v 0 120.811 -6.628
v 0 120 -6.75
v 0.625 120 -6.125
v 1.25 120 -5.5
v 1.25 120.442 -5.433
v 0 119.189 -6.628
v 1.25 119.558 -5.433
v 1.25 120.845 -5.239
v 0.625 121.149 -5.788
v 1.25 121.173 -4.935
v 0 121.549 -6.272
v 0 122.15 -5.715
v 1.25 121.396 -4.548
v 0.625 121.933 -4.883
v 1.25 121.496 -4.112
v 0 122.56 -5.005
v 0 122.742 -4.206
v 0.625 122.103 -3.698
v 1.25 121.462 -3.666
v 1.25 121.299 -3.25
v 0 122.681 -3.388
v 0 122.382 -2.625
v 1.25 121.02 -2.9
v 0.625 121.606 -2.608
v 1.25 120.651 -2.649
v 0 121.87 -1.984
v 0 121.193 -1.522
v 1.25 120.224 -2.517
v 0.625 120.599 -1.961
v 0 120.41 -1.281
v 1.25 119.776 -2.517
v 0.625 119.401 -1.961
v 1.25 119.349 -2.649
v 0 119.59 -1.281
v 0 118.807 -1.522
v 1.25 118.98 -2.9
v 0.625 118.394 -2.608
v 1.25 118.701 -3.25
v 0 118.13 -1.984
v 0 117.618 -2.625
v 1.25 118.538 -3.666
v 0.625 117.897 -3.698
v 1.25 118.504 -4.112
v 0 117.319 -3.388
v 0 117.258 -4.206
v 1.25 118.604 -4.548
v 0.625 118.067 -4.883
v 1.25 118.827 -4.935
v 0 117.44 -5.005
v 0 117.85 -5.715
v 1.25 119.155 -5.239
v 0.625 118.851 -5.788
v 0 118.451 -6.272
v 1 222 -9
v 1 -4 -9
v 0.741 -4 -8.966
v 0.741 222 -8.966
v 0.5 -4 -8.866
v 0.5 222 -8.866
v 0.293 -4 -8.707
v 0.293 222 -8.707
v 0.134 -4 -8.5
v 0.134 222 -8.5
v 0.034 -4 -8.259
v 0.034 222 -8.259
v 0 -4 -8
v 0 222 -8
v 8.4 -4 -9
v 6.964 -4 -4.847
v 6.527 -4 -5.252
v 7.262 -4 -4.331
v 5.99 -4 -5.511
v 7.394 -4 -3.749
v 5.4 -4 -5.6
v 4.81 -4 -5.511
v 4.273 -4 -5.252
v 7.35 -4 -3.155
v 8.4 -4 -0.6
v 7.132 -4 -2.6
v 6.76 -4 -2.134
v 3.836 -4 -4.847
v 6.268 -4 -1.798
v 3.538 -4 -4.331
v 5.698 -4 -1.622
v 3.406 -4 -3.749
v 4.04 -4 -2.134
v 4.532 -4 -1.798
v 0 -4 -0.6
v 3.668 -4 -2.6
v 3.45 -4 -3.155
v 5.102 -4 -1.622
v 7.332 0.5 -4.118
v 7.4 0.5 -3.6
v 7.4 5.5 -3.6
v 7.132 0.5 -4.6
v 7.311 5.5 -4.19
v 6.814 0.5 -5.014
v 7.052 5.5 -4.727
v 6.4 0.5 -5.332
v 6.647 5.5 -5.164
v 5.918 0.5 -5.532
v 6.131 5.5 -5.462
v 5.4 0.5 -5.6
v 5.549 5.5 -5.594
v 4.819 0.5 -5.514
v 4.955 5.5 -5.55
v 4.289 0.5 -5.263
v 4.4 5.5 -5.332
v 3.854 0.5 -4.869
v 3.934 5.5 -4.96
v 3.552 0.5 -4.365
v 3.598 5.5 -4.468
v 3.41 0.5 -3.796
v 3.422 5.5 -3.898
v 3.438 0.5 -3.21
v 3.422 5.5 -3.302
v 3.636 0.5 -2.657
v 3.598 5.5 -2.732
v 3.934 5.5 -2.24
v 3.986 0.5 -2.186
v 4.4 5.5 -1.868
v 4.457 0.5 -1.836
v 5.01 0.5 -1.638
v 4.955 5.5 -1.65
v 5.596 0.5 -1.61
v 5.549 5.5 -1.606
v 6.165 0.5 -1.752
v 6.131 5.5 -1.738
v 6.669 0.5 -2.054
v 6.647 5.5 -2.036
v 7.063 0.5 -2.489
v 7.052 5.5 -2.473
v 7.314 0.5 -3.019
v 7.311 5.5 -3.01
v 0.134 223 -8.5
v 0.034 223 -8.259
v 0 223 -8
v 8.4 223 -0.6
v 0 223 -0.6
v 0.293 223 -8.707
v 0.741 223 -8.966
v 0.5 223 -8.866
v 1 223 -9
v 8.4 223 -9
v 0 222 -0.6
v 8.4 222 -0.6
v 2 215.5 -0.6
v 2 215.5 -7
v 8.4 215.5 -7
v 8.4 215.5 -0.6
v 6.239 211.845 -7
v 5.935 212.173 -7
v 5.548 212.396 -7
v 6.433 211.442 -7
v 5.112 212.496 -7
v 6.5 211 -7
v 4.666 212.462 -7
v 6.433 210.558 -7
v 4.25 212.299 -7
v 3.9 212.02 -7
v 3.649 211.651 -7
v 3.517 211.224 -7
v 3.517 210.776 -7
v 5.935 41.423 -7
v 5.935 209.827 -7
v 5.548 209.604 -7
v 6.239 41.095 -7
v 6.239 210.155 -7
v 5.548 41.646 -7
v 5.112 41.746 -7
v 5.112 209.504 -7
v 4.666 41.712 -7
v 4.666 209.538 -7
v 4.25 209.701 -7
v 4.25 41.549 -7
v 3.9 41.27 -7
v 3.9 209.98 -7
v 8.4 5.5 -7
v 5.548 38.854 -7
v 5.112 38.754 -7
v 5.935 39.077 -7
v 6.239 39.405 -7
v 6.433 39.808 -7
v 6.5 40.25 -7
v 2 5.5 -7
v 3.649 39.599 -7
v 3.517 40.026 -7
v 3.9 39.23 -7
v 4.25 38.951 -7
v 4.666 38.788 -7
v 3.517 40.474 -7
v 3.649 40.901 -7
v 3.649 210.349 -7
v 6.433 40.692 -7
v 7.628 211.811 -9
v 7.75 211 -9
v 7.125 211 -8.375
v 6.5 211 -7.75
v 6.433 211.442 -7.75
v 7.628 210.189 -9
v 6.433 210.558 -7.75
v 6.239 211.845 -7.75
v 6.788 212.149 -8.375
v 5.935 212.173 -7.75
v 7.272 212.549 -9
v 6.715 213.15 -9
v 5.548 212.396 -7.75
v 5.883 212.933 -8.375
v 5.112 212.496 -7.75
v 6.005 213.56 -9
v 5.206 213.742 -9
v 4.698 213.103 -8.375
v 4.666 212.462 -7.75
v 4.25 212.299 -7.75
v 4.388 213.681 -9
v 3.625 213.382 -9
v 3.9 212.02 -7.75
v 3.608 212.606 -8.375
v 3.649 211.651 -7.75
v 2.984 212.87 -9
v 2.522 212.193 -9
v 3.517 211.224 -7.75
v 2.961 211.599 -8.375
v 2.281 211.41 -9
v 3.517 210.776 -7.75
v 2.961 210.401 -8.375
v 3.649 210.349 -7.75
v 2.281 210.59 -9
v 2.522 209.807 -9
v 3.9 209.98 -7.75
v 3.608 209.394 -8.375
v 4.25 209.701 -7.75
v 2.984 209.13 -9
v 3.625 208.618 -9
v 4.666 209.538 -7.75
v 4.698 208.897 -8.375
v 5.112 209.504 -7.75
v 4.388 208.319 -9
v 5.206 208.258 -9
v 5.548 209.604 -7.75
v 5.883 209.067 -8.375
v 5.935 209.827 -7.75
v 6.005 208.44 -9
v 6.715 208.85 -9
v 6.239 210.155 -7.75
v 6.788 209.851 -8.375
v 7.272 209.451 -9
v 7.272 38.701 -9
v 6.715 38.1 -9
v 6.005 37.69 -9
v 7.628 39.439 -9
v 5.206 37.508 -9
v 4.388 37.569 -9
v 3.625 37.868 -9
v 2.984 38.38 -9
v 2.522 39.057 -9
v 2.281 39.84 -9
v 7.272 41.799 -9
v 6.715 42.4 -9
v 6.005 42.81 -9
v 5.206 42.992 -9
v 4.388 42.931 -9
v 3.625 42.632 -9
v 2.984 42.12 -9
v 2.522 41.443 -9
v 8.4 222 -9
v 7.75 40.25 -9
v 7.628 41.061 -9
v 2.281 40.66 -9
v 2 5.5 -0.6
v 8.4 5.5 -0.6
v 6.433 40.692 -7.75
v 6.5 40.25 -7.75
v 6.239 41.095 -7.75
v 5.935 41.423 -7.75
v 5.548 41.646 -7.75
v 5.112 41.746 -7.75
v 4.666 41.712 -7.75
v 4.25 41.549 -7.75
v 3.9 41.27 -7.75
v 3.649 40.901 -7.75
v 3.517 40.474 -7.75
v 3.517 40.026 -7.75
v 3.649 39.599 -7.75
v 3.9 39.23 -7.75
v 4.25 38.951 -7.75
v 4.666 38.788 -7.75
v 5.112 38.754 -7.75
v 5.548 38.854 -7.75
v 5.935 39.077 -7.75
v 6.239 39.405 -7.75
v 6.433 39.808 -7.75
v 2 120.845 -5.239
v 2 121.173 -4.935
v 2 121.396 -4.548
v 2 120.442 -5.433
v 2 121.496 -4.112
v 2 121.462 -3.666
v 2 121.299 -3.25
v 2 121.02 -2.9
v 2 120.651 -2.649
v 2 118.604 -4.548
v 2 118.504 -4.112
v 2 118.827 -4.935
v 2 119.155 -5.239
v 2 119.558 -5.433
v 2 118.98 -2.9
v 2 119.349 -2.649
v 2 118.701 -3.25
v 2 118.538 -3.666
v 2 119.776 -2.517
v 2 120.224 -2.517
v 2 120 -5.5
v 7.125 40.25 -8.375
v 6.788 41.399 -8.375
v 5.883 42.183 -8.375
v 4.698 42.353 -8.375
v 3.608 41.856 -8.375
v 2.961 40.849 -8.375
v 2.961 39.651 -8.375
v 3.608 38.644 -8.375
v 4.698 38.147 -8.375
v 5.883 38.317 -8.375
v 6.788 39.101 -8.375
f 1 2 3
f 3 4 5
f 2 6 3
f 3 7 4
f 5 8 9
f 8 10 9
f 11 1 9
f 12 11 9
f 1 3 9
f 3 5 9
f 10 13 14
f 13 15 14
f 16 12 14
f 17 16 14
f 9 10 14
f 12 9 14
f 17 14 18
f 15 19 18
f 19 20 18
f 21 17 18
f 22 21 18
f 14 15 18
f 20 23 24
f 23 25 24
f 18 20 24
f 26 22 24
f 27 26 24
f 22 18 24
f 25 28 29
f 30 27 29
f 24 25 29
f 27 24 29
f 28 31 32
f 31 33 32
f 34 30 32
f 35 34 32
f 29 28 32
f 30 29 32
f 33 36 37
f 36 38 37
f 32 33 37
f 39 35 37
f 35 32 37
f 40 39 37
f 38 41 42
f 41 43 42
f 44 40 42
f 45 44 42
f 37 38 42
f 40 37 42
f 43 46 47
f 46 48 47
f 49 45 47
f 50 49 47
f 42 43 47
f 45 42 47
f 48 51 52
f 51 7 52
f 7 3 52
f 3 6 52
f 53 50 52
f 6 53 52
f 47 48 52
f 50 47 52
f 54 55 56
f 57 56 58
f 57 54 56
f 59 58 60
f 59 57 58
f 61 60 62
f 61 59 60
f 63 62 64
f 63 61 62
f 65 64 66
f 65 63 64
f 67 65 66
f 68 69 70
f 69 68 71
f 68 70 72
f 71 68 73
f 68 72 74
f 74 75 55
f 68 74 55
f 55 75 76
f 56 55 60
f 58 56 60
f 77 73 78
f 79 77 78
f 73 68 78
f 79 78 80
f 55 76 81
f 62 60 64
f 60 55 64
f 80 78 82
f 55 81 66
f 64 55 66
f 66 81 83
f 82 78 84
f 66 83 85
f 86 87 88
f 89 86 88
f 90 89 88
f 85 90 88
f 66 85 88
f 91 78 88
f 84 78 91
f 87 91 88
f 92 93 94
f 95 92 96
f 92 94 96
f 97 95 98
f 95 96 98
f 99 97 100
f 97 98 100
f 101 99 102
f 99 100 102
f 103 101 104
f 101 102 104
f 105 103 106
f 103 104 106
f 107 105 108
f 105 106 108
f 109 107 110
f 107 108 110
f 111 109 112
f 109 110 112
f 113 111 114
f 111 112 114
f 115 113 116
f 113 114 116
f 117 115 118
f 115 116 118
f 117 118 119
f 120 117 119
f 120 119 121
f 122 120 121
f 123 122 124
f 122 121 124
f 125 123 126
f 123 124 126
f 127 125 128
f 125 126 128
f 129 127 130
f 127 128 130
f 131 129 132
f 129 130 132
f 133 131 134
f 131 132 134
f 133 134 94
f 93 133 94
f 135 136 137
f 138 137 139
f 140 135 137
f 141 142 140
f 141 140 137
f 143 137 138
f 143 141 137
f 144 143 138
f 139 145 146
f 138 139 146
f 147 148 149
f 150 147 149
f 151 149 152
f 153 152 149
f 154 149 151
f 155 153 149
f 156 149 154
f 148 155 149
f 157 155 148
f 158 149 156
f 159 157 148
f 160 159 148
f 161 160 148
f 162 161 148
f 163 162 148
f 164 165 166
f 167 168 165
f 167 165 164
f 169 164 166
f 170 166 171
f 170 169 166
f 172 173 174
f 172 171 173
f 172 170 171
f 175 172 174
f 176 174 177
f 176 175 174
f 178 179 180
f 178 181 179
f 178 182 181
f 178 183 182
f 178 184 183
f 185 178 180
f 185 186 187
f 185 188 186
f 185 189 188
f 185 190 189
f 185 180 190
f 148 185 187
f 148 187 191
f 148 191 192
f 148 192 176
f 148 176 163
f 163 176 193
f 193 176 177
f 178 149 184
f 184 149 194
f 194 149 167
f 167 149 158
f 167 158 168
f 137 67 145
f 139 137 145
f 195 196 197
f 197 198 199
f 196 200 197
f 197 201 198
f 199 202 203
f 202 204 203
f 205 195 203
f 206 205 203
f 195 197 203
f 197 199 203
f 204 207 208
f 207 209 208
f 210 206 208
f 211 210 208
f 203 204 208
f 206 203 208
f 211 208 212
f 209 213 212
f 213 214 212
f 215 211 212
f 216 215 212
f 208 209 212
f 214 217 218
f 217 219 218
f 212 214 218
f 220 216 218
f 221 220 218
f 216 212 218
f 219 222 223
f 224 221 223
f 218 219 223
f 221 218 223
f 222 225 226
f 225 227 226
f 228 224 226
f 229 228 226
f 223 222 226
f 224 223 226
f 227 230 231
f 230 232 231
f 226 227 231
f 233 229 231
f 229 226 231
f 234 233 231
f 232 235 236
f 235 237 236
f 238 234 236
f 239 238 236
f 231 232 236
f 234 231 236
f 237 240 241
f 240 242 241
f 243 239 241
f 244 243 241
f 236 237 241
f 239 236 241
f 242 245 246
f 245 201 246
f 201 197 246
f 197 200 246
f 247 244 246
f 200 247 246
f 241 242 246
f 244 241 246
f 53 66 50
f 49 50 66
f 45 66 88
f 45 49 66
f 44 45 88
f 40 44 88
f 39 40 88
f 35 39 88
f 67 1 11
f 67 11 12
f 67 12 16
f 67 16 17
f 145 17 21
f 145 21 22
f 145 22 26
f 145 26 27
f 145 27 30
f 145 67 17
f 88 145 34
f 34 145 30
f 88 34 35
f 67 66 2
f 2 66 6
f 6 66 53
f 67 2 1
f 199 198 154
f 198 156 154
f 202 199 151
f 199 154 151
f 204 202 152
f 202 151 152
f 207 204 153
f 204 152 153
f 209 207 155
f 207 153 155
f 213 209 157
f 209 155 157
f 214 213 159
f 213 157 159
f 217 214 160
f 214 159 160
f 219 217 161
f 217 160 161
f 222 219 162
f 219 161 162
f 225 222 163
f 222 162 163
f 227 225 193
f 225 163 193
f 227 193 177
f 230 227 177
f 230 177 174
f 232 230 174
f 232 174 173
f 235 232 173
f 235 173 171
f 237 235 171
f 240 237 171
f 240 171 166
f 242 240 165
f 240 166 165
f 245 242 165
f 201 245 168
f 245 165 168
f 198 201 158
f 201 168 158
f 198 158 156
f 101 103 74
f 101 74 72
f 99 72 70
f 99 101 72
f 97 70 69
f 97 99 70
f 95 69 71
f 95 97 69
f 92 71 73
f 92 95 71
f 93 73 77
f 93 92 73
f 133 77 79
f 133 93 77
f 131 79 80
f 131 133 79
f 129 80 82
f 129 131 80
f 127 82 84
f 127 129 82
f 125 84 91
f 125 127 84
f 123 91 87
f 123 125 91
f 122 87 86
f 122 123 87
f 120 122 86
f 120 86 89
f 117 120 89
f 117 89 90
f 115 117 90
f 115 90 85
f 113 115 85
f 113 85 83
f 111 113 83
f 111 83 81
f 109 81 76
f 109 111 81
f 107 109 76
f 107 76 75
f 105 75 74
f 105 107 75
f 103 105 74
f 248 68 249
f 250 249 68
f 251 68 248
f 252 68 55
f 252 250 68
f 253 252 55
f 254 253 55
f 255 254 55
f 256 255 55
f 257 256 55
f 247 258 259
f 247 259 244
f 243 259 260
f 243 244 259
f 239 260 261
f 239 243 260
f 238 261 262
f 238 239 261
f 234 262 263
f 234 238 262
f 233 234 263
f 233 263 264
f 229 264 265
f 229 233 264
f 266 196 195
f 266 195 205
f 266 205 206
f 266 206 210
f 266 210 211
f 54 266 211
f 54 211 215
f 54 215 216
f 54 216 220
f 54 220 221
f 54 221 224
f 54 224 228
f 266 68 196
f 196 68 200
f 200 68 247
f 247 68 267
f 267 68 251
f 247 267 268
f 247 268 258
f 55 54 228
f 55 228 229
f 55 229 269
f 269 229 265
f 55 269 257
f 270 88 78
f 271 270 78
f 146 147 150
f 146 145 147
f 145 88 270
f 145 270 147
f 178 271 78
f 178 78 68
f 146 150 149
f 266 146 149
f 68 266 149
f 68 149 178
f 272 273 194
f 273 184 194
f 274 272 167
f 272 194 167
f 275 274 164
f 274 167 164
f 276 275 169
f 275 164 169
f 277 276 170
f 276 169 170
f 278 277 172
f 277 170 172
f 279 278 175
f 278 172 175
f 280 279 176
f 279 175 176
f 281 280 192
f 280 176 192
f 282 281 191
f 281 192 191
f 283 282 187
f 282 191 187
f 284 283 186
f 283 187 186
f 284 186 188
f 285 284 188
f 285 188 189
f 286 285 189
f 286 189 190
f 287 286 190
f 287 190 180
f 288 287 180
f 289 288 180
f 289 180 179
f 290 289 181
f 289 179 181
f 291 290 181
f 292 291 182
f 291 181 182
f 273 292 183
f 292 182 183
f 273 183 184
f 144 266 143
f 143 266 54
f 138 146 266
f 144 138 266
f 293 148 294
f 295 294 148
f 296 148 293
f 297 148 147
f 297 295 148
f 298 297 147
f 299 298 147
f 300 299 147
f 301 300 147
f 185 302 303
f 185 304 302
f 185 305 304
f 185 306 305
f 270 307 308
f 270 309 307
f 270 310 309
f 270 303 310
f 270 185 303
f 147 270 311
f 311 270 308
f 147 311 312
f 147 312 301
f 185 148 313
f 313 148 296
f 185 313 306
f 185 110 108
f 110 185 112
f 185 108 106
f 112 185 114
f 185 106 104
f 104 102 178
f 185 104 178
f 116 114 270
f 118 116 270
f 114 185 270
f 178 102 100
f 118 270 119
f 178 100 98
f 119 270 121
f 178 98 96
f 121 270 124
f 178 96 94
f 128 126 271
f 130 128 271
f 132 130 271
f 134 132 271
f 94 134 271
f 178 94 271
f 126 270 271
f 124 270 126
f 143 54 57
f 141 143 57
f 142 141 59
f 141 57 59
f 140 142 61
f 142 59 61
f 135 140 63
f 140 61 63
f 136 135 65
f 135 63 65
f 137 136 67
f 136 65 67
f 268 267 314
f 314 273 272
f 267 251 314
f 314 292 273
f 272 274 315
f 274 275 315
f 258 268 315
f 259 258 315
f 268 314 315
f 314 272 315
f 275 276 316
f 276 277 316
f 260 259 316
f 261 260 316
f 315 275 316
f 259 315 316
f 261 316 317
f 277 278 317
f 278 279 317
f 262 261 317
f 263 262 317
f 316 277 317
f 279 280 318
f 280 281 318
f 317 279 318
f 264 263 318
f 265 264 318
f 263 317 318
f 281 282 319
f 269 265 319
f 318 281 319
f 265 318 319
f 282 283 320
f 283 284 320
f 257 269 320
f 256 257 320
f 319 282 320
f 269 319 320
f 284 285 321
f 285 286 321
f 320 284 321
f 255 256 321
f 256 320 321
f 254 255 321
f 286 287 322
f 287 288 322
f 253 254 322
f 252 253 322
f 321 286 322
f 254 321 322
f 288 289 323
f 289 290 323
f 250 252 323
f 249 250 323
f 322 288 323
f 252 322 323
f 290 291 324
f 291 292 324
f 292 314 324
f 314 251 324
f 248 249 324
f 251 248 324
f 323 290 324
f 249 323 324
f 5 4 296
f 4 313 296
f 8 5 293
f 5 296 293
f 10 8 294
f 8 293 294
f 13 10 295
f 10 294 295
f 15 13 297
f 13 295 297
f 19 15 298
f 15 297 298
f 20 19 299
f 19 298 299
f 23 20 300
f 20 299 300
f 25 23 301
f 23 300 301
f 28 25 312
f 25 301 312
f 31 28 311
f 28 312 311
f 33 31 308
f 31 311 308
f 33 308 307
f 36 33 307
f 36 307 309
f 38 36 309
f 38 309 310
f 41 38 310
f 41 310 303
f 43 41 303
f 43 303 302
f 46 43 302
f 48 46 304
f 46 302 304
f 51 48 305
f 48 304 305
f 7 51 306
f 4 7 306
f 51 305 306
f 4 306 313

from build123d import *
from build123d.topology import SkipClean

# Parameters (mm, degrees)
BOSS_EXTRUDE1_DEPTH                                 = 221.5
CSK_FOR_M3_COUNTERSUNK_FLAT_HEAD_SCREW1_D           = 3
CSK_FOR_M3_COUNTERSUNK_FLAT_HEAD_SCREW1_CSINK_D     = 5.5
CSK_FOR_M3_COUNTERSUNK_FLAT_HEAD_SCREW1_CSINK_ANGLE = 90
CSK_FOR_M3_COUNTERSUNK_FLAT_HEAD_SCREW4_D           = 3
CSK_FOR_M3_COUNTERSUNK_FLAT_HEAD_SCREW4_CSINK_D     = 5.5
CSK_FOR_M3_COUNTERSUNK_FLAT_HEAD_SCREW4_CSINK_ANGLE = 90
SKETCH12_W                                          = 8
SKETCH12_H                                          = 7
BOSS_EXTRUDE2_DEPTH                                 = 5.5
CUT_EXTRUDE1_DEPTH                                  = 359
BOSS_EXTRUDE3_DEPTH                                 = 3
BOSS_EXTRUDE4_DEPTH                                 = 2.5
BOSS_EXTRUDE4_DEPTH_BACK                            = 6
SKETCH19_W                                          = 0.6
SKETCH19_H                                          = 227
CUT_EXTRUDE2_DEPTH                                  = 10
SKETCH20_W                                          = 15.604741464
SKETCH20_H                                          = 2
CUT_EXTRUDE3_DEPTH                                  = 10
SKETCH21_W                                          = 0.6
SKETCH21_H                                          = 225
CUT_EXTRUDE4_DEPTH                                  = 10
SKETCH22_W                                          = 8.4
SKETCH22_H                                          = 5.5
CUT_EXTRUDE5_DEPTH                                  = 10
BOSS_EXTRUDE5_DEPTH                                 = 2
TAP_DRILL_FOR_M4X0_7_TAP1_D                         = 4
TAP_DRILL_FOR_M4X0_7_TAP1_DEPTH                     = 5
BOSS_EXTRUDE6_DEPTH                                 = 221.5
FILLET1_R                                           = 1
SKETCH30_R                                          = 2
BOSS_EXTRUDE7_DEPTH                                 = 4.5
BOSS_EXTRUDE8_DEPTH                                 = 1


with BuildPart() as part:
    # Sketch1 → Boss-Extrude1 (new body)
    with BuildSketch(Plane(origin=(0, 0, 0), x_dir=(1, 0, 0), z_dir=(0, 1, 0))):
        Polygon((0, 0), (0, 9), (9, 9), (9, 7), (2, 7), (2, 0), align=None)
    extrude(amount=BOSS_EXTRUDE1_DEPTH)

    # CSK for M3 Countersunk Flat Head Screw1 (through all)
    with Locations(Plane.ZY):
        with Locations((-4, 120)):
            CounterSinkHole(CSK_FOR_M3_COUNTERSUNK_FLAT_HEAD_SCREW1_D / 2, CSK_FOR_M3_COUNTERSUNK_FLAT_HEAD_SCREW1_CSINK_D / 2, counter_sink_angle=CSK_FOR_M3_COUNTERSUNK_FLAT_HEAD_SCREW1_CSINK_ANGLE)

    # CSK for M3 Countersunk Flat Head Screw4 (through all)
    with Locations(Plane(origin=(0, 0, -9), x_dir=(-1, 0, 0), z_dir=(0, 0, -1))):
        with Locations((-5, 40.25), (-5, 211)):
            CounterSinkHole(CSK_FOR_M3_COUNTERSUNK_FLAT_HEAD_SCREW4_D / 2, CSK_FOR_M3_COUNTERSUNK_FLAT_HEAD_SCREW4_CSINK_D / 2, counter_sink_angle=CSK_FOR_M3_COUNTERSUNK_FLAT_HEAD_SCREW4_CSINK_ANGLE)

    # Sketch12 → Boss-Extrude2 (add)
    with BuildSketch(Plane.XZ):
        with Locations((5, -3.5)):
            Rectangle(SKETCH12_W, SKETCH12_H)
    extrude(amount=-BOSS_EXTRUDE2_DEPTH)

    # Sketch13 → Cut-Extrude1 (cut)
    with BuildSketch(Plane(origin=(0, 221.5, 0), x_dir=(1, 0, 0), z_dir=(0, 1, 0))):
        Polygon((0, 8), (1, 9), (0, 9), align=None)
    extrude(amount=-CUT_EXTRUDE1_DEPTH, mode=Mode.SUBTRACT)

    # Sketch14 → Boss-Extrude3 (add)
    with BuildSketch(Plane.XZ):
        Polygon((0, 0), (9, 0), (9, -9), (1, -9), (0, -8), align=None)
    extrude(amount=BOSS_EXTRUDE3_DEPTH)

    # Sketch18 → Boss-Extrude4 (add, two sides: drawn at the far end of the back side and taken through both)
    with BuildSketch(Plane(origin=(0, 221.5, 0), x_dir=(1, 0, 0), z_dir=(0, 1, 0)).offset(-BOSS_EXTRUDE4_DEPTH_BACK)):
        Polygon((0, 0), (9, 0), (9, 9), (1, 9), (0, 8), align=None)
    extrude(amount=BOSS_EXTRUDE4_DEPTH + BOSS_EXTRUDE4_DEPTH_BACK)

    # Sketch19 → Cut-Extrude2 (cut)
    with BuildSketch(Plane.ZY):
        with Locations((-0.3, 110.5)):
            Rectangle(SKETCH19_W, SKETCH19_H)
    extrude(amount=-CUT_EXTRUDE2_DEPTH, mode=Mode.SUBTRACT)

    # Sketch20 → Cut-Extrude3 (cut)
    with BuildSketch(Plane.ZY):
        with Locations((-8.402370732, 223)):
            Rectangle(SKETCH20_W, SKETCH20_H)
    extrude(amount=-CUT_EXTRUDE3_DEPTH, mode=Mode.SUBTRACT)

    # Sketch21 → Cut-Extrude4 (cut)
    with BuildSketch(Plane(origin=(0, 0, -9), x_dir=(-1, 0, 0), z_dir=(0, 0, -1))):
        with Locations((-8.7, 109.5)):
            Rectangle(SKETCH21_W, SKETCH21_H)
    extrude(amount=-CUT_EXTRUDE4_DEPTH, mode=Mode.SUBTRACT)

    # Sketch22 → Cut-Extrude5 (cut)
    with BuildSketch(Plane(origin=(0, 0, -9), x_dir=(-1, 0, 0), z_dir=(0, 0, -1))):
        with Locations((-4.2, -0.25)):
            Rectangle(SKETCH22_W, SKETCH22_H)
    extrude(amount=-CUT_EXTRUDE5_DEPTH, mode=Mode.SUBTRACT)

    # Sketch26 → Boss-Extrude5 (add)
    with BuildSketch(Plane.XZ.offset(-2.5)):
        Polygon((8.4, -9), (8.4, -0.6), (0, -0.6), (0, -8), (1, -9), align=None)
    extrude(amount=BOSS_EXTRUDE5_DEPTH)

    # Tap Drill for M4x0.7 Tap1
    with Locations(Plane(origin=(0, 0.5, 0), x_dir=(-1, 0, 0), z_dir=(0, -1, 0))):
        with Locations((-5.4, 3.6)):
            Hole(TAP_DRILL_FOR_M4X0_7_TAP1_D / 2, depth=TAP_DRILL_FOR_M4X0_7_TAP1_DEPTH)

    # Sketch29 → Boss-Extrude6 (add)
    with BuildSketch(Plane(origin=(0, 222, 0), x_dir=(1, 0, 0), z_dir=(0, 1, 0))):
        Polygon((0, 8), (1, 9), (0, 9), align=None)
    extrude(amount=-BOSS_EXTRUDE6_DEPTH)

    # Fillet1
    fillet1_edges = [part.edges().sort_by_distance(p)[0] for p in [
        (0, 111.25, -9),
    ]]
    fillet(fillet1_edges, radius=FILLET1_R)

    # Sketch30 → Boss-Extrude7 (add)
    with SkipClean():  # the faces are left unmerged after this step: merging them gives an invalid solid
        with BuildSketch(Plane.XZ.offset(-0.5)):
            with BuildLine():
                Line((0, -0.6), (8.4, -0.6))
                Line((8.4, -0.6), (8.4, -9))
                Line((8.4, -9), (1, -9))
                ThreePointArc((1, -9), (0.292893219, -8.707106781), (0, -8))
                Line((0, -8), (0, -0.6))
            make_face()
            with Locations(Location((5.4, -3.6, 0), (0, 0, 270))):
                Circle(SKETCH30_R, mode=Mode.SUBTRACT)
        extrude(amount=BOSS_EXTRUDE7_DEPTH)
    add(part.part.scale(1), mode=Mode.REPLACE)  # the faces are merged on a copy

    # Sketch32 → Boss-Extrude8 (add)
    with SkipClean():  # the faces are left unmerged after this step: merging them gives an invalid solid
        with BuildSketch(Plane(origin=(0, 222, 0), x_dir=(1, 0, 0), z_dir=(0, 1, 0))):
            with BuildLine():
                Line((0, 0.6), (8.4, 0.6))
                Line((8.4, 0.6), (8.4, 9))
                Line((8.4, 9), (1, 9))
                ThreePointArc((1, 9), (0.292893219, 8.707106781), (0, 8))
                Line((0, 8), (0, 0.6))
            make_face()
        extrude(amount=BOSS_EXTRUDE8_DEPTH)


solid = part.part
